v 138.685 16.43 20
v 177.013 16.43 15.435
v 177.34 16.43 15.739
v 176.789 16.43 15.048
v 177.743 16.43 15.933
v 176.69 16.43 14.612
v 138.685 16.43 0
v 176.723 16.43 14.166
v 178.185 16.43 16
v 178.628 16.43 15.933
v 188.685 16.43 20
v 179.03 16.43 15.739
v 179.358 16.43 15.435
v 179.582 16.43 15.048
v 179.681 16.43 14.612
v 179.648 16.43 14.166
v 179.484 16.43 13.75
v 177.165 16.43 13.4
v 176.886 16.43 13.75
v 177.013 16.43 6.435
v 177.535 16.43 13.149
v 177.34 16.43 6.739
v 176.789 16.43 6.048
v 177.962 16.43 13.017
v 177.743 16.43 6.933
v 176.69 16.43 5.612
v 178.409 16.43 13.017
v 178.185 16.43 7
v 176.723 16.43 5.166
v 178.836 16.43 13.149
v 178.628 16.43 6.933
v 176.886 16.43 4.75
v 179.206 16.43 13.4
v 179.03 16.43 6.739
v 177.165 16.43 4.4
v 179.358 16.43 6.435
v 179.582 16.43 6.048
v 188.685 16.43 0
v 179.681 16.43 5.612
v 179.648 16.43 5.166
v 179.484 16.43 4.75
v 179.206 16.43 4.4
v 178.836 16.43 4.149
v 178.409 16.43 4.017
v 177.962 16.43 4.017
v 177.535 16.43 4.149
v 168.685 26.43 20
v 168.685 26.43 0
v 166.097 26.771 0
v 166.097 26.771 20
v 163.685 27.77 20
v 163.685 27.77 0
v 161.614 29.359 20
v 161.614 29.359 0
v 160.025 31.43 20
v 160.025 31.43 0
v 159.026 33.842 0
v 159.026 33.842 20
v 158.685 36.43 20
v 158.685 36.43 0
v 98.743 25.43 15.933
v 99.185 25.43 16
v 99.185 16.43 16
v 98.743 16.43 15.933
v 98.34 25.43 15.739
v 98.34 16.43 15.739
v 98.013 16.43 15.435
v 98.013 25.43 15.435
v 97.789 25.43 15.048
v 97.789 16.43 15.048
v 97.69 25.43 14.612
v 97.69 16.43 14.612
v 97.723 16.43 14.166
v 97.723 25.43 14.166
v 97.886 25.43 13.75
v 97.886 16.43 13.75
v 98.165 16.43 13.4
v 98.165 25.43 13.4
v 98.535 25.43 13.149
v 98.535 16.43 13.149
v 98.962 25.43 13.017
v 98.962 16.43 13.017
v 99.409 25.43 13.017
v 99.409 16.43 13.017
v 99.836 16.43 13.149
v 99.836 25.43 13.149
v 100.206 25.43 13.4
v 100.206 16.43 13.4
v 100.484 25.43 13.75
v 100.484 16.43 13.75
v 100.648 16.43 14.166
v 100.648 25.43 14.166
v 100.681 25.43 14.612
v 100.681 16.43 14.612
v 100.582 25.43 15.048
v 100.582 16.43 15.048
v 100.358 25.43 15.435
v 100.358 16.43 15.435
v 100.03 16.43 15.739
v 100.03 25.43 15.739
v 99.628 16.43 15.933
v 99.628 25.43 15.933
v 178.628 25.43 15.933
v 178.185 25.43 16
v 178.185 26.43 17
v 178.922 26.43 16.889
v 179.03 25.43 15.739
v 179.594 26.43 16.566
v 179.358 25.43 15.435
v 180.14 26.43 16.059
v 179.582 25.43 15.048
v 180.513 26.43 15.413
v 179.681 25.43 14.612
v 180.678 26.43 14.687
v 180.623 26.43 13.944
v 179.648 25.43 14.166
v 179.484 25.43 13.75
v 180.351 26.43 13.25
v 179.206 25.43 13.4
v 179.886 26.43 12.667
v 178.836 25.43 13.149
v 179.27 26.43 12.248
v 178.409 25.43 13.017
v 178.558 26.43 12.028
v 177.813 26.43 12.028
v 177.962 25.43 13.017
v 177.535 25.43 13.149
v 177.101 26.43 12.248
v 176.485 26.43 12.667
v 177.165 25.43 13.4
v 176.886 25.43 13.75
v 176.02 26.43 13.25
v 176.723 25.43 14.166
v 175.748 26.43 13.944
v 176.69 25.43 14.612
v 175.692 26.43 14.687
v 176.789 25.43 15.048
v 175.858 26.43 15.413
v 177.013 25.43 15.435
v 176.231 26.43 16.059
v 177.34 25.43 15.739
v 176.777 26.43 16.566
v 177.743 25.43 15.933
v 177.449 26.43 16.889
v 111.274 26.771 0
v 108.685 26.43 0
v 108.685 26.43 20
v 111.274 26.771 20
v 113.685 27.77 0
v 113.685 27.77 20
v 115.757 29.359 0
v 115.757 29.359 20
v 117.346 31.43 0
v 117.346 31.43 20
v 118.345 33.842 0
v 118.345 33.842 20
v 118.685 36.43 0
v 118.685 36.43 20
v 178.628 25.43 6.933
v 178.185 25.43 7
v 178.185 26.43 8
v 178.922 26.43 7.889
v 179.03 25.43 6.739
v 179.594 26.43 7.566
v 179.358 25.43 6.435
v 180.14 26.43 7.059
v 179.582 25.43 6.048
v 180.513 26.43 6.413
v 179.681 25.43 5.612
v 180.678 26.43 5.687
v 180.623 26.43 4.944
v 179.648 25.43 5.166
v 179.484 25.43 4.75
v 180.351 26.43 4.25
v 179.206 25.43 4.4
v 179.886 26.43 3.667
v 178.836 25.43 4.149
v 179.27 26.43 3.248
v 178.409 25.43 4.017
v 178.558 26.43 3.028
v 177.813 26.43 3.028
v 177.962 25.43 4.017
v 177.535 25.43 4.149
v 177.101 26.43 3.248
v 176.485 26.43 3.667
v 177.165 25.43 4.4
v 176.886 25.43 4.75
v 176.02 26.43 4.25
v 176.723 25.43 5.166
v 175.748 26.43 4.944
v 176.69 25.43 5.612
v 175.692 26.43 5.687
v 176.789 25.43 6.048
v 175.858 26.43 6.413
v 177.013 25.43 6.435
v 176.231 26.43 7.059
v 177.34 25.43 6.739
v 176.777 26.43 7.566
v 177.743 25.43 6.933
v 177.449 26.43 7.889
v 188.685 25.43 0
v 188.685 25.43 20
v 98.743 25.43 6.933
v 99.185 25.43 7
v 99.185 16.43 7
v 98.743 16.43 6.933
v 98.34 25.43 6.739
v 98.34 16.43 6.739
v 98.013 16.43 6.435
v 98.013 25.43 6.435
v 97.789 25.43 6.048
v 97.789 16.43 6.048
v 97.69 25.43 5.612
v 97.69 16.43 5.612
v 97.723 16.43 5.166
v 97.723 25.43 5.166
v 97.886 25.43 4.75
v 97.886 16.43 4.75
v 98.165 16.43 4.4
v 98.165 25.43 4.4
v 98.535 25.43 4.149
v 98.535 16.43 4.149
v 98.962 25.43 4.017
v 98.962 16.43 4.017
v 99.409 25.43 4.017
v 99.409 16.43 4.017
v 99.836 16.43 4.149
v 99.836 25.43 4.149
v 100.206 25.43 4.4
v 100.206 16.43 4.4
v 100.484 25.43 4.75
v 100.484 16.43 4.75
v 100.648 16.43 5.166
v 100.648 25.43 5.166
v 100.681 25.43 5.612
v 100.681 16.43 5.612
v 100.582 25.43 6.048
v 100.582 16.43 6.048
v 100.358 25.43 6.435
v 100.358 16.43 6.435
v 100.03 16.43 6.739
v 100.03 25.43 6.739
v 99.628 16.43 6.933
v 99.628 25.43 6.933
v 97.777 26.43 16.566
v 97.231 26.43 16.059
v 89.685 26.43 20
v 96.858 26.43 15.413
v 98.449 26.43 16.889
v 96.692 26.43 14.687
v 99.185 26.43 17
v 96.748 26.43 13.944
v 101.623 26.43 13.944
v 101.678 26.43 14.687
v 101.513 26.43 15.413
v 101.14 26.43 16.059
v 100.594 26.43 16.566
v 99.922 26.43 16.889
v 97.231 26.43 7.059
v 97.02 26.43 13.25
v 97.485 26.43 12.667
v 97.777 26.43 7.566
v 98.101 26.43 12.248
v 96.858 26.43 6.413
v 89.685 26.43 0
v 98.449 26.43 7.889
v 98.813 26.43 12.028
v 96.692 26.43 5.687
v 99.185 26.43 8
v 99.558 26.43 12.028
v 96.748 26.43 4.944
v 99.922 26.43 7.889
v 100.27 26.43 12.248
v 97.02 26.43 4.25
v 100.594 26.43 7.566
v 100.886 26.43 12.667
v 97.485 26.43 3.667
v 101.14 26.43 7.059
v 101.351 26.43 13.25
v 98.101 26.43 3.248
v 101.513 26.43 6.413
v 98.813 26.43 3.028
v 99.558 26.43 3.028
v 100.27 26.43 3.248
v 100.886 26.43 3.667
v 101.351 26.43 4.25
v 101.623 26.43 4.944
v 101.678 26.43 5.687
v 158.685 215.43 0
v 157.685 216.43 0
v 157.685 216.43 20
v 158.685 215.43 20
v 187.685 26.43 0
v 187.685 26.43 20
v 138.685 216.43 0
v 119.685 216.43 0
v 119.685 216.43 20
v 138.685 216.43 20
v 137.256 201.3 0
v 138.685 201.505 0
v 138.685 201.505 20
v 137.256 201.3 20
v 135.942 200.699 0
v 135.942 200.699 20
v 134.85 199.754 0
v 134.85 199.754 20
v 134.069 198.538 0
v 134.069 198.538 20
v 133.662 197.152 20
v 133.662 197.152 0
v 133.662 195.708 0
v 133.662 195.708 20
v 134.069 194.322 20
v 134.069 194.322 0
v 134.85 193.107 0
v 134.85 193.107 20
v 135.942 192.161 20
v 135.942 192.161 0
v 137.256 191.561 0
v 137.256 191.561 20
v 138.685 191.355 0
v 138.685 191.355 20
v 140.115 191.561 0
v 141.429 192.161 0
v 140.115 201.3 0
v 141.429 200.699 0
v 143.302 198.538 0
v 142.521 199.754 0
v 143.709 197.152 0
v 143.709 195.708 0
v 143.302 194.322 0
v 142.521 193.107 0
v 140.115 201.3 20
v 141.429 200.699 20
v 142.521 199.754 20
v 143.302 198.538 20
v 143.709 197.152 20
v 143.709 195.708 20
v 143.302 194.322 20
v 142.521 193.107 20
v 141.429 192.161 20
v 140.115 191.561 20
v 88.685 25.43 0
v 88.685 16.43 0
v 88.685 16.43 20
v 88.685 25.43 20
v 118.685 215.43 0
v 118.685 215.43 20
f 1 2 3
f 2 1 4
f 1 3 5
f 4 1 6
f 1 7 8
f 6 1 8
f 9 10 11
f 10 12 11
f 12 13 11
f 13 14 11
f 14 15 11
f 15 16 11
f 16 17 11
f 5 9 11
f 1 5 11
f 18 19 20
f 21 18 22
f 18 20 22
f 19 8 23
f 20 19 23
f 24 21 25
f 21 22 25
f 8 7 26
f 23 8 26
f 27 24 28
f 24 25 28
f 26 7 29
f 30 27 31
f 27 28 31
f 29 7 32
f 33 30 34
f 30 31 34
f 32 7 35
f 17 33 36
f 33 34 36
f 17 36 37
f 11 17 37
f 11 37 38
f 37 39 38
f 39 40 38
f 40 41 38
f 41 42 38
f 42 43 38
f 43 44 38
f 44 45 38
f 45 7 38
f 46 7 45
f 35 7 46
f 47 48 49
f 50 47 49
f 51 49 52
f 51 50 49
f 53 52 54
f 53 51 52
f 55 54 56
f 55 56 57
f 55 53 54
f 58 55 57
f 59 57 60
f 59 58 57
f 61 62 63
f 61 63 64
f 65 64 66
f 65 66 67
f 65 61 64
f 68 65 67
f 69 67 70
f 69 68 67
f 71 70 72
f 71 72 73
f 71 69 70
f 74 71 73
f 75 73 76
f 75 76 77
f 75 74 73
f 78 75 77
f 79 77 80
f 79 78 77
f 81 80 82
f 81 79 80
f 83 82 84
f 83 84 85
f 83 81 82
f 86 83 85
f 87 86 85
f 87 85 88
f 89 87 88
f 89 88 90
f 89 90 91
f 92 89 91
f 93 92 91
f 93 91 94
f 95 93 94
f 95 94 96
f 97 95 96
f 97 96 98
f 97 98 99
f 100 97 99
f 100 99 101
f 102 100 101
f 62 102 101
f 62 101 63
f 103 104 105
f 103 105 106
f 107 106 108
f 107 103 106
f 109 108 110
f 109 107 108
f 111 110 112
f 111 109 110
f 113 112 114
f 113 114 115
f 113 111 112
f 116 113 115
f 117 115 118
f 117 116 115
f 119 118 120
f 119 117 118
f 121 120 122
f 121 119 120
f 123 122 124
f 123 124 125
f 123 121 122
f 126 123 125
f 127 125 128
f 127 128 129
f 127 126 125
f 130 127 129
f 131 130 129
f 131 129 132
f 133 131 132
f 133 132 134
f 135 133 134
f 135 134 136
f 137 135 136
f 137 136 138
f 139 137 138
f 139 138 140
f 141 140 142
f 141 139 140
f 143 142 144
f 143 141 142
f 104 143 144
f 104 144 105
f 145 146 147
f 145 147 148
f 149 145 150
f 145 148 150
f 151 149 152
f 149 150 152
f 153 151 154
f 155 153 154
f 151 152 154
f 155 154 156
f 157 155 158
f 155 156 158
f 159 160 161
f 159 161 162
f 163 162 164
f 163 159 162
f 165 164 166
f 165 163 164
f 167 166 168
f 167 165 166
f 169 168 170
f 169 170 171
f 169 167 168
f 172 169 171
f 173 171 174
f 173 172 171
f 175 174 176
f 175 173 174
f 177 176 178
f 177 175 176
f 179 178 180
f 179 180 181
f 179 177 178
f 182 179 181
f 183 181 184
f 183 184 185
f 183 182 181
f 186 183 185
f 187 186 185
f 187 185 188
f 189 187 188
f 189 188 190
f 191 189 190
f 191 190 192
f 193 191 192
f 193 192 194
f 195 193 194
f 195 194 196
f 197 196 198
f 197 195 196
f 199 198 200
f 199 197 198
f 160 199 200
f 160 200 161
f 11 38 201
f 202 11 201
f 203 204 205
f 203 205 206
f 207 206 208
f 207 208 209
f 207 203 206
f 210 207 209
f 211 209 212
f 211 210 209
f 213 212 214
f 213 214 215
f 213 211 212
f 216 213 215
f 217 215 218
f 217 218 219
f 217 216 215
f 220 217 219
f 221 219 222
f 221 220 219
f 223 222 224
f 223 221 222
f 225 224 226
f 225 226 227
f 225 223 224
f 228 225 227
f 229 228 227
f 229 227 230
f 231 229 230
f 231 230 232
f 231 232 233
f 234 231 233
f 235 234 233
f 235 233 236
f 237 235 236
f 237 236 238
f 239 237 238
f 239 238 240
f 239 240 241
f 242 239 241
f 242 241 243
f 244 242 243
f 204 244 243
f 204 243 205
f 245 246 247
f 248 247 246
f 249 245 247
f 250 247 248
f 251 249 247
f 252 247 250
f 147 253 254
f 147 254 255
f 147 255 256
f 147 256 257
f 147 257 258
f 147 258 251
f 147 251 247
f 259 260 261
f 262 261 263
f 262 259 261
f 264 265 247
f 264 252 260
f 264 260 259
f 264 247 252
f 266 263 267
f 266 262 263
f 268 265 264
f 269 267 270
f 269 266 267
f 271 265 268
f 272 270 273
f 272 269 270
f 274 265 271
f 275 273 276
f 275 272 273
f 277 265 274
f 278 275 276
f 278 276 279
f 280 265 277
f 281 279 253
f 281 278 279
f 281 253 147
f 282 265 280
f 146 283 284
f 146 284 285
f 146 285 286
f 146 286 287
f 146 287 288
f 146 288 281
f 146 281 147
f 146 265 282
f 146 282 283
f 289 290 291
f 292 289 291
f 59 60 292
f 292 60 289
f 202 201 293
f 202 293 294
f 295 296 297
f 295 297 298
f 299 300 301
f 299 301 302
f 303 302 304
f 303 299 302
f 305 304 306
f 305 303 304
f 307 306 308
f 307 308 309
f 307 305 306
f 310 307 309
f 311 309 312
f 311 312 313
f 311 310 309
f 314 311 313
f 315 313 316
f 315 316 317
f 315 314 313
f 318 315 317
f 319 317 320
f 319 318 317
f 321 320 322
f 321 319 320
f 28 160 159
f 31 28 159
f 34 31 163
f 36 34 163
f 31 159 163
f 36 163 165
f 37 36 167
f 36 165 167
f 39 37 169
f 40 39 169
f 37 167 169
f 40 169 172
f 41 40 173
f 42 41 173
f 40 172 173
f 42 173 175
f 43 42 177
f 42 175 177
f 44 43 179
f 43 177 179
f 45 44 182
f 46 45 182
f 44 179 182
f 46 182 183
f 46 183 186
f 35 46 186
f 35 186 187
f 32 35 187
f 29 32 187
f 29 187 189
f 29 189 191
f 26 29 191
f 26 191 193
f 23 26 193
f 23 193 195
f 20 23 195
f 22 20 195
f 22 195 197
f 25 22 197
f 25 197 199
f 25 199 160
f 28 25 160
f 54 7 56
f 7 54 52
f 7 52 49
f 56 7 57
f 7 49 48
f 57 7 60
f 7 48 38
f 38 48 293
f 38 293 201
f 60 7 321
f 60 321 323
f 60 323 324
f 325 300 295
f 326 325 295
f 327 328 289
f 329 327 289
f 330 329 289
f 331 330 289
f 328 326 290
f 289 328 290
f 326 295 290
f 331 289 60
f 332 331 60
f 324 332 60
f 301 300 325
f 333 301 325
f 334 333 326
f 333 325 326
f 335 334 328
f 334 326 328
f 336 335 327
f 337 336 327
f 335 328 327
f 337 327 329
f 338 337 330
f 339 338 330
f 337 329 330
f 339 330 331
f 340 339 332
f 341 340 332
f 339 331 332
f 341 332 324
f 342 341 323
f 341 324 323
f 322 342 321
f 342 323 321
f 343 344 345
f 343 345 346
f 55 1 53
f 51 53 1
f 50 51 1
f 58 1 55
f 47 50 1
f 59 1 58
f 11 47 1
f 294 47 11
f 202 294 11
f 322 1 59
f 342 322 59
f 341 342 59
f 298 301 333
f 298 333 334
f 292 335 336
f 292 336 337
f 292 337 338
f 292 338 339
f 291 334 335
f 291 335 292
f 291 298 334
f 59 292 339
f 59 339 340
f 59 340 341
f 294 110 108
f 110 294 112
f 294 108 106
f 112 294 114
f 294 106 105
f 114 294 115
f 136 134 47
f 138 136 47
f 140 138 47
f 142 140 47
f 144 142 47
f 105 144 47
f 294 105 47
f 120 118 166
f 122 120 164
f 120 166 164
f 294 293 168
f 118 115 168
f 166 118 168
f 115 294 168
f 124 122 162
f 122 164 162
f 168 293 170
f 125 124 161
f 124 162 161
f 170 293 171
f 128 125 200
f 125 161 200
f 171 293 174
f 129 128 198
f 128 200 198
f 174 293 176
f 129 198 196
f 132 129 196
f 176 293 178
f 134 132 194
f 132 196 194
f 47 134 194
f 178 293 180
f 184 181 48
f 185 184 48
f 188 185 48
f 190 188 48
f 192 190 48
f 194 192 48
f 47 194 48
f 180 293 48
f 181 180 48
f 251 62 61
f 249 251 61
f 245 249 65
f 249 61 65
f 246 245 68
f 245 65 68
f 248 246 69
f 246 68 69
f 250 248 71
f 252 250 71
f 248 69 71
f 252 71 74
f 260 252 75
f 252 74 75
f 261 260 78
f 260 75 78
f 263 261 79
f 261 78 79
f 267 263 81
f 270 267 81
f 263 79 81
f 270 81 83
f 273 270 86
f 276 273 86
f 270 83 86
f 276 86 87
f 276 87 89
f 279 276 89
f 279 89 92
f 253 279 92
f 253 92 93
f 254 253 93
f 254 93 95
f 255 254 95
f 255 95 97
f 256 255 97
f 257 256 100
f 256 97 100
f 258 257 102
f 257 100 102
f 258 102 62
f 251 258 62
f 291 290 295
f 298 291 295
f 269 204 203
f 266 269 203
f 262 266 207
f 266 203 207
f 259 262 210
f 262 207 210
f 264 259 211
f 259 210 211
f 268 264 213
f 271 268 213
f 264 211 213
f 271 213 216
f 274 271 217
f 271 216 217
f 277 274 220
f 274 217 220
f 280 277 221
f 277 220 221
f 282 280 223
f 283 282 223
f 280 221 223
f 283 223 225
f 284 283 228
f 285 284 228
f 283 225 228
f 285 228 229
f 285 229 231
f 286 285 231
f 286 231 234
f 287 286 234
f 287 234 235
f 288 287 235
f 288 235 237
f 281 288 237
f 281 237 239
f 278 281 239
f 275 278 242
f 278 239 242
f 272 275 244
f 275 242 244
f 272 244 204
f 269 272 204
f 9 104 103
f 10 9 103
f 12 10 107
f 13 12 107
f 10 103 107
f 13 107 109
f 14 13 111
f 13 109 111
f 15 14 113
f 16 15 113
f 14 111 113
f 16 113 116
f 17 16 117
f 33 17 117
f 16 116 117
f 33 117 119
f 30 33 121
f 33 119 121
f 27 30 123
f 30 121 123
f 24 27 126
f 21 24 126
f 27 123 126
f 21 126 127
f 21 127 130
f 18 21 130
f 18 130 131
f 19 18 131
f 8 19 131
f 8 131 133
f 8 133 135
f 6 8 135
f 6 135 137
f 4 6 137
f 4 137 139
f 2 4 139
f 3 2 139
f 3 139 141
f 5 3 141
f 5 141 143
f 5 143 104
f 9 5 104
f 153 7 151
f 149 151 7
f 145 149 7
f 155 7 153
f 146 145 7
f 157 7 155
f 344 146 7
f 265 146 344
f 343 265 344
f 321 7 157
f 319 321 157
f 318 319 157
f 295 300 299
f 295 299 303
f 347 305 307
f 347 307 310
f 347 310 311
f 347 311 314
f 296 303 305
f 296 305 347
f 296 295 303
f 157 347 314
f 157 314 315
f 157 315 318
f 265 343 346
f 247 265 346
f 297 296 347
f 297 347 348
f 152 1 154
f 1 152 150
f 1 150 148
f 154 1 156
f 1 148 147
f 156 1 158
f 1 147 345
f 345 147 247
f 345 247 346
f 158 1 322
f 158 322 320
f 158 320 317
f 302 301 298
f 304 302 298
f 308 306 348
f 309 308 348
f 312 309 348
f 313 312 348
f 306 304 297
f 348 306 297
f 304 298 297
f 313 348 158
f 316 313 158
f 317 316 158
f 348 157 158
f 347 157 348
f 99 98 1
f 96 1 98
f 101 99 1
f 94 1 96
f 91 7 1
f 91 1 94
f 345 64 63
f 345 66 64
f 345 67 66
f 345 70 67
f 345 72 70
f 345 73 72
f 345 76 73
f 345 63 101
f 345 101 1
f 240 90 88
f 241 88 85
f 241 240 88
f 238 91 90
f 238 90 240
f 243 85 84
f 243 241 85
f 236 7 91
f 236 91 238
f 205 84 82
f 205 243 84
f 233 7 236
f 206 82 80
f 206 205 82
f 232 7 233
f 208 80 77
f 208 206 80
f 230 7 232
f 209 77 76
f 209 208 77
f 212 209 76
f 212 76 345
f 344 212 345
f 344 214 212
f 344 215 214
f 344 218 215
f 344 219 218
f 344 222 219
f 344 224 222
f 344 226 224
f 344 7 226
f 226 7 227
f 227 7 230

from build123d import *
from build123d.topology import SkipClean

# Parameters (mm, degrees)
BOSS_EXTRUDE2_DEPTH = 20
FILLET1_R           = 10
CHAMFER1_SIZE       = 1
SKETCH2_R           = 1.5
CUT_EXTRUDE1_DEPTH  = 20
CHAMFER3_SIZE       = 1


with BuildPart() as part:
    # Sketch1 → Boss-Extrude2 (new body)
    with BuildSketch(Plane.XY):
        with BuildLine():
            Line((138.685446009, 16.430118313), (158.685446009, 16.430118313))
            Line((158.685446009, 16.430118313), (188.685446009, 16.430118313))
            Line((188.685446009, 16.430118313), (188.685446009, 26.430118313))
            Line((188.685446009, 26.430118313), (158.685446009, 26.430118313))
            Line((158.685446009, 26.430118313), (158.685446009, 216.430118313))
            Line((158.685446009, 216.430118313), (138.685446009, 216.430118313))
            Line((138.685446009, 216.430118313), (138.685446009, 201.505118313))
            ThreePointArc((138.685446009, 201.505118313), (143.760446009, 196.430118313), (138.685446009, 191.355118313))
            Line((138.685446009, 191.355118313), (138.685446009, 16.430118313))
        make_face()
    extrude(amount=BOSS_EXTRUDE2_DEPTH)

    # Fillet1
    fillet1_edges = [part.edges().sort_by_distance(p)[0] for p in [
        (158.685446009, 26.430118313, 10),
    ]]
    fillet(fillet1_edges, radius=FILLET1_R)

    # Chamfer1
    chamfer1_edges = [part.edges().sort_by_distance(p)[0] for p in [
        (158.685446009, 216.430118313, 10),
        (188.685446009, 26.430118313, 10),
    ]]
    chamfer(chamfer1_edges, length=CHAMFER1_SIZE)

    # Sketch2 → Cut-Extrude1 (cut)
    with BuildSketch(Plane(origin=(0, 26.430118313, 0), x_dir=(1, 0, 0), z_dir=(0, 1, 0))):
        with Locations(Location((178.185446009, -5.5, 0), (0, 0, 270))):
            Circle(SKETCH2_R)
        with Locations(Location((178.185446009, -14.5, 0), (0, 0, 270))):
            Circle(SKETCH2_R)
    extrude(amount=-CUT_EXTRUDE1_DEPTH, mode=Mode.SUBTRACT)

    # Chamfer3
    chamfer3_edges = [part.edges().sort_by_distance(p)[0] for p in [
        (178.185446009, 26.430118313, 4),
        (178.185446009, 26.430118313, 13),
    ]]
    chamfer(chamfer3_edges, length=CHAMFER3_SIZE)

    # Mirror1: part across plane


with BuildPart() as part_1:
    with SkipClean():  # the faces are left unmerged after this step: merging them gives an invalid solid
        add(part.part)
        add(part.part.mirror(Plane(origin=(138.685446009, 16.430118313, 20), x_dir=(0, 0, 1), z_dir=(1, 0, 0))))


solid = part_1.part
